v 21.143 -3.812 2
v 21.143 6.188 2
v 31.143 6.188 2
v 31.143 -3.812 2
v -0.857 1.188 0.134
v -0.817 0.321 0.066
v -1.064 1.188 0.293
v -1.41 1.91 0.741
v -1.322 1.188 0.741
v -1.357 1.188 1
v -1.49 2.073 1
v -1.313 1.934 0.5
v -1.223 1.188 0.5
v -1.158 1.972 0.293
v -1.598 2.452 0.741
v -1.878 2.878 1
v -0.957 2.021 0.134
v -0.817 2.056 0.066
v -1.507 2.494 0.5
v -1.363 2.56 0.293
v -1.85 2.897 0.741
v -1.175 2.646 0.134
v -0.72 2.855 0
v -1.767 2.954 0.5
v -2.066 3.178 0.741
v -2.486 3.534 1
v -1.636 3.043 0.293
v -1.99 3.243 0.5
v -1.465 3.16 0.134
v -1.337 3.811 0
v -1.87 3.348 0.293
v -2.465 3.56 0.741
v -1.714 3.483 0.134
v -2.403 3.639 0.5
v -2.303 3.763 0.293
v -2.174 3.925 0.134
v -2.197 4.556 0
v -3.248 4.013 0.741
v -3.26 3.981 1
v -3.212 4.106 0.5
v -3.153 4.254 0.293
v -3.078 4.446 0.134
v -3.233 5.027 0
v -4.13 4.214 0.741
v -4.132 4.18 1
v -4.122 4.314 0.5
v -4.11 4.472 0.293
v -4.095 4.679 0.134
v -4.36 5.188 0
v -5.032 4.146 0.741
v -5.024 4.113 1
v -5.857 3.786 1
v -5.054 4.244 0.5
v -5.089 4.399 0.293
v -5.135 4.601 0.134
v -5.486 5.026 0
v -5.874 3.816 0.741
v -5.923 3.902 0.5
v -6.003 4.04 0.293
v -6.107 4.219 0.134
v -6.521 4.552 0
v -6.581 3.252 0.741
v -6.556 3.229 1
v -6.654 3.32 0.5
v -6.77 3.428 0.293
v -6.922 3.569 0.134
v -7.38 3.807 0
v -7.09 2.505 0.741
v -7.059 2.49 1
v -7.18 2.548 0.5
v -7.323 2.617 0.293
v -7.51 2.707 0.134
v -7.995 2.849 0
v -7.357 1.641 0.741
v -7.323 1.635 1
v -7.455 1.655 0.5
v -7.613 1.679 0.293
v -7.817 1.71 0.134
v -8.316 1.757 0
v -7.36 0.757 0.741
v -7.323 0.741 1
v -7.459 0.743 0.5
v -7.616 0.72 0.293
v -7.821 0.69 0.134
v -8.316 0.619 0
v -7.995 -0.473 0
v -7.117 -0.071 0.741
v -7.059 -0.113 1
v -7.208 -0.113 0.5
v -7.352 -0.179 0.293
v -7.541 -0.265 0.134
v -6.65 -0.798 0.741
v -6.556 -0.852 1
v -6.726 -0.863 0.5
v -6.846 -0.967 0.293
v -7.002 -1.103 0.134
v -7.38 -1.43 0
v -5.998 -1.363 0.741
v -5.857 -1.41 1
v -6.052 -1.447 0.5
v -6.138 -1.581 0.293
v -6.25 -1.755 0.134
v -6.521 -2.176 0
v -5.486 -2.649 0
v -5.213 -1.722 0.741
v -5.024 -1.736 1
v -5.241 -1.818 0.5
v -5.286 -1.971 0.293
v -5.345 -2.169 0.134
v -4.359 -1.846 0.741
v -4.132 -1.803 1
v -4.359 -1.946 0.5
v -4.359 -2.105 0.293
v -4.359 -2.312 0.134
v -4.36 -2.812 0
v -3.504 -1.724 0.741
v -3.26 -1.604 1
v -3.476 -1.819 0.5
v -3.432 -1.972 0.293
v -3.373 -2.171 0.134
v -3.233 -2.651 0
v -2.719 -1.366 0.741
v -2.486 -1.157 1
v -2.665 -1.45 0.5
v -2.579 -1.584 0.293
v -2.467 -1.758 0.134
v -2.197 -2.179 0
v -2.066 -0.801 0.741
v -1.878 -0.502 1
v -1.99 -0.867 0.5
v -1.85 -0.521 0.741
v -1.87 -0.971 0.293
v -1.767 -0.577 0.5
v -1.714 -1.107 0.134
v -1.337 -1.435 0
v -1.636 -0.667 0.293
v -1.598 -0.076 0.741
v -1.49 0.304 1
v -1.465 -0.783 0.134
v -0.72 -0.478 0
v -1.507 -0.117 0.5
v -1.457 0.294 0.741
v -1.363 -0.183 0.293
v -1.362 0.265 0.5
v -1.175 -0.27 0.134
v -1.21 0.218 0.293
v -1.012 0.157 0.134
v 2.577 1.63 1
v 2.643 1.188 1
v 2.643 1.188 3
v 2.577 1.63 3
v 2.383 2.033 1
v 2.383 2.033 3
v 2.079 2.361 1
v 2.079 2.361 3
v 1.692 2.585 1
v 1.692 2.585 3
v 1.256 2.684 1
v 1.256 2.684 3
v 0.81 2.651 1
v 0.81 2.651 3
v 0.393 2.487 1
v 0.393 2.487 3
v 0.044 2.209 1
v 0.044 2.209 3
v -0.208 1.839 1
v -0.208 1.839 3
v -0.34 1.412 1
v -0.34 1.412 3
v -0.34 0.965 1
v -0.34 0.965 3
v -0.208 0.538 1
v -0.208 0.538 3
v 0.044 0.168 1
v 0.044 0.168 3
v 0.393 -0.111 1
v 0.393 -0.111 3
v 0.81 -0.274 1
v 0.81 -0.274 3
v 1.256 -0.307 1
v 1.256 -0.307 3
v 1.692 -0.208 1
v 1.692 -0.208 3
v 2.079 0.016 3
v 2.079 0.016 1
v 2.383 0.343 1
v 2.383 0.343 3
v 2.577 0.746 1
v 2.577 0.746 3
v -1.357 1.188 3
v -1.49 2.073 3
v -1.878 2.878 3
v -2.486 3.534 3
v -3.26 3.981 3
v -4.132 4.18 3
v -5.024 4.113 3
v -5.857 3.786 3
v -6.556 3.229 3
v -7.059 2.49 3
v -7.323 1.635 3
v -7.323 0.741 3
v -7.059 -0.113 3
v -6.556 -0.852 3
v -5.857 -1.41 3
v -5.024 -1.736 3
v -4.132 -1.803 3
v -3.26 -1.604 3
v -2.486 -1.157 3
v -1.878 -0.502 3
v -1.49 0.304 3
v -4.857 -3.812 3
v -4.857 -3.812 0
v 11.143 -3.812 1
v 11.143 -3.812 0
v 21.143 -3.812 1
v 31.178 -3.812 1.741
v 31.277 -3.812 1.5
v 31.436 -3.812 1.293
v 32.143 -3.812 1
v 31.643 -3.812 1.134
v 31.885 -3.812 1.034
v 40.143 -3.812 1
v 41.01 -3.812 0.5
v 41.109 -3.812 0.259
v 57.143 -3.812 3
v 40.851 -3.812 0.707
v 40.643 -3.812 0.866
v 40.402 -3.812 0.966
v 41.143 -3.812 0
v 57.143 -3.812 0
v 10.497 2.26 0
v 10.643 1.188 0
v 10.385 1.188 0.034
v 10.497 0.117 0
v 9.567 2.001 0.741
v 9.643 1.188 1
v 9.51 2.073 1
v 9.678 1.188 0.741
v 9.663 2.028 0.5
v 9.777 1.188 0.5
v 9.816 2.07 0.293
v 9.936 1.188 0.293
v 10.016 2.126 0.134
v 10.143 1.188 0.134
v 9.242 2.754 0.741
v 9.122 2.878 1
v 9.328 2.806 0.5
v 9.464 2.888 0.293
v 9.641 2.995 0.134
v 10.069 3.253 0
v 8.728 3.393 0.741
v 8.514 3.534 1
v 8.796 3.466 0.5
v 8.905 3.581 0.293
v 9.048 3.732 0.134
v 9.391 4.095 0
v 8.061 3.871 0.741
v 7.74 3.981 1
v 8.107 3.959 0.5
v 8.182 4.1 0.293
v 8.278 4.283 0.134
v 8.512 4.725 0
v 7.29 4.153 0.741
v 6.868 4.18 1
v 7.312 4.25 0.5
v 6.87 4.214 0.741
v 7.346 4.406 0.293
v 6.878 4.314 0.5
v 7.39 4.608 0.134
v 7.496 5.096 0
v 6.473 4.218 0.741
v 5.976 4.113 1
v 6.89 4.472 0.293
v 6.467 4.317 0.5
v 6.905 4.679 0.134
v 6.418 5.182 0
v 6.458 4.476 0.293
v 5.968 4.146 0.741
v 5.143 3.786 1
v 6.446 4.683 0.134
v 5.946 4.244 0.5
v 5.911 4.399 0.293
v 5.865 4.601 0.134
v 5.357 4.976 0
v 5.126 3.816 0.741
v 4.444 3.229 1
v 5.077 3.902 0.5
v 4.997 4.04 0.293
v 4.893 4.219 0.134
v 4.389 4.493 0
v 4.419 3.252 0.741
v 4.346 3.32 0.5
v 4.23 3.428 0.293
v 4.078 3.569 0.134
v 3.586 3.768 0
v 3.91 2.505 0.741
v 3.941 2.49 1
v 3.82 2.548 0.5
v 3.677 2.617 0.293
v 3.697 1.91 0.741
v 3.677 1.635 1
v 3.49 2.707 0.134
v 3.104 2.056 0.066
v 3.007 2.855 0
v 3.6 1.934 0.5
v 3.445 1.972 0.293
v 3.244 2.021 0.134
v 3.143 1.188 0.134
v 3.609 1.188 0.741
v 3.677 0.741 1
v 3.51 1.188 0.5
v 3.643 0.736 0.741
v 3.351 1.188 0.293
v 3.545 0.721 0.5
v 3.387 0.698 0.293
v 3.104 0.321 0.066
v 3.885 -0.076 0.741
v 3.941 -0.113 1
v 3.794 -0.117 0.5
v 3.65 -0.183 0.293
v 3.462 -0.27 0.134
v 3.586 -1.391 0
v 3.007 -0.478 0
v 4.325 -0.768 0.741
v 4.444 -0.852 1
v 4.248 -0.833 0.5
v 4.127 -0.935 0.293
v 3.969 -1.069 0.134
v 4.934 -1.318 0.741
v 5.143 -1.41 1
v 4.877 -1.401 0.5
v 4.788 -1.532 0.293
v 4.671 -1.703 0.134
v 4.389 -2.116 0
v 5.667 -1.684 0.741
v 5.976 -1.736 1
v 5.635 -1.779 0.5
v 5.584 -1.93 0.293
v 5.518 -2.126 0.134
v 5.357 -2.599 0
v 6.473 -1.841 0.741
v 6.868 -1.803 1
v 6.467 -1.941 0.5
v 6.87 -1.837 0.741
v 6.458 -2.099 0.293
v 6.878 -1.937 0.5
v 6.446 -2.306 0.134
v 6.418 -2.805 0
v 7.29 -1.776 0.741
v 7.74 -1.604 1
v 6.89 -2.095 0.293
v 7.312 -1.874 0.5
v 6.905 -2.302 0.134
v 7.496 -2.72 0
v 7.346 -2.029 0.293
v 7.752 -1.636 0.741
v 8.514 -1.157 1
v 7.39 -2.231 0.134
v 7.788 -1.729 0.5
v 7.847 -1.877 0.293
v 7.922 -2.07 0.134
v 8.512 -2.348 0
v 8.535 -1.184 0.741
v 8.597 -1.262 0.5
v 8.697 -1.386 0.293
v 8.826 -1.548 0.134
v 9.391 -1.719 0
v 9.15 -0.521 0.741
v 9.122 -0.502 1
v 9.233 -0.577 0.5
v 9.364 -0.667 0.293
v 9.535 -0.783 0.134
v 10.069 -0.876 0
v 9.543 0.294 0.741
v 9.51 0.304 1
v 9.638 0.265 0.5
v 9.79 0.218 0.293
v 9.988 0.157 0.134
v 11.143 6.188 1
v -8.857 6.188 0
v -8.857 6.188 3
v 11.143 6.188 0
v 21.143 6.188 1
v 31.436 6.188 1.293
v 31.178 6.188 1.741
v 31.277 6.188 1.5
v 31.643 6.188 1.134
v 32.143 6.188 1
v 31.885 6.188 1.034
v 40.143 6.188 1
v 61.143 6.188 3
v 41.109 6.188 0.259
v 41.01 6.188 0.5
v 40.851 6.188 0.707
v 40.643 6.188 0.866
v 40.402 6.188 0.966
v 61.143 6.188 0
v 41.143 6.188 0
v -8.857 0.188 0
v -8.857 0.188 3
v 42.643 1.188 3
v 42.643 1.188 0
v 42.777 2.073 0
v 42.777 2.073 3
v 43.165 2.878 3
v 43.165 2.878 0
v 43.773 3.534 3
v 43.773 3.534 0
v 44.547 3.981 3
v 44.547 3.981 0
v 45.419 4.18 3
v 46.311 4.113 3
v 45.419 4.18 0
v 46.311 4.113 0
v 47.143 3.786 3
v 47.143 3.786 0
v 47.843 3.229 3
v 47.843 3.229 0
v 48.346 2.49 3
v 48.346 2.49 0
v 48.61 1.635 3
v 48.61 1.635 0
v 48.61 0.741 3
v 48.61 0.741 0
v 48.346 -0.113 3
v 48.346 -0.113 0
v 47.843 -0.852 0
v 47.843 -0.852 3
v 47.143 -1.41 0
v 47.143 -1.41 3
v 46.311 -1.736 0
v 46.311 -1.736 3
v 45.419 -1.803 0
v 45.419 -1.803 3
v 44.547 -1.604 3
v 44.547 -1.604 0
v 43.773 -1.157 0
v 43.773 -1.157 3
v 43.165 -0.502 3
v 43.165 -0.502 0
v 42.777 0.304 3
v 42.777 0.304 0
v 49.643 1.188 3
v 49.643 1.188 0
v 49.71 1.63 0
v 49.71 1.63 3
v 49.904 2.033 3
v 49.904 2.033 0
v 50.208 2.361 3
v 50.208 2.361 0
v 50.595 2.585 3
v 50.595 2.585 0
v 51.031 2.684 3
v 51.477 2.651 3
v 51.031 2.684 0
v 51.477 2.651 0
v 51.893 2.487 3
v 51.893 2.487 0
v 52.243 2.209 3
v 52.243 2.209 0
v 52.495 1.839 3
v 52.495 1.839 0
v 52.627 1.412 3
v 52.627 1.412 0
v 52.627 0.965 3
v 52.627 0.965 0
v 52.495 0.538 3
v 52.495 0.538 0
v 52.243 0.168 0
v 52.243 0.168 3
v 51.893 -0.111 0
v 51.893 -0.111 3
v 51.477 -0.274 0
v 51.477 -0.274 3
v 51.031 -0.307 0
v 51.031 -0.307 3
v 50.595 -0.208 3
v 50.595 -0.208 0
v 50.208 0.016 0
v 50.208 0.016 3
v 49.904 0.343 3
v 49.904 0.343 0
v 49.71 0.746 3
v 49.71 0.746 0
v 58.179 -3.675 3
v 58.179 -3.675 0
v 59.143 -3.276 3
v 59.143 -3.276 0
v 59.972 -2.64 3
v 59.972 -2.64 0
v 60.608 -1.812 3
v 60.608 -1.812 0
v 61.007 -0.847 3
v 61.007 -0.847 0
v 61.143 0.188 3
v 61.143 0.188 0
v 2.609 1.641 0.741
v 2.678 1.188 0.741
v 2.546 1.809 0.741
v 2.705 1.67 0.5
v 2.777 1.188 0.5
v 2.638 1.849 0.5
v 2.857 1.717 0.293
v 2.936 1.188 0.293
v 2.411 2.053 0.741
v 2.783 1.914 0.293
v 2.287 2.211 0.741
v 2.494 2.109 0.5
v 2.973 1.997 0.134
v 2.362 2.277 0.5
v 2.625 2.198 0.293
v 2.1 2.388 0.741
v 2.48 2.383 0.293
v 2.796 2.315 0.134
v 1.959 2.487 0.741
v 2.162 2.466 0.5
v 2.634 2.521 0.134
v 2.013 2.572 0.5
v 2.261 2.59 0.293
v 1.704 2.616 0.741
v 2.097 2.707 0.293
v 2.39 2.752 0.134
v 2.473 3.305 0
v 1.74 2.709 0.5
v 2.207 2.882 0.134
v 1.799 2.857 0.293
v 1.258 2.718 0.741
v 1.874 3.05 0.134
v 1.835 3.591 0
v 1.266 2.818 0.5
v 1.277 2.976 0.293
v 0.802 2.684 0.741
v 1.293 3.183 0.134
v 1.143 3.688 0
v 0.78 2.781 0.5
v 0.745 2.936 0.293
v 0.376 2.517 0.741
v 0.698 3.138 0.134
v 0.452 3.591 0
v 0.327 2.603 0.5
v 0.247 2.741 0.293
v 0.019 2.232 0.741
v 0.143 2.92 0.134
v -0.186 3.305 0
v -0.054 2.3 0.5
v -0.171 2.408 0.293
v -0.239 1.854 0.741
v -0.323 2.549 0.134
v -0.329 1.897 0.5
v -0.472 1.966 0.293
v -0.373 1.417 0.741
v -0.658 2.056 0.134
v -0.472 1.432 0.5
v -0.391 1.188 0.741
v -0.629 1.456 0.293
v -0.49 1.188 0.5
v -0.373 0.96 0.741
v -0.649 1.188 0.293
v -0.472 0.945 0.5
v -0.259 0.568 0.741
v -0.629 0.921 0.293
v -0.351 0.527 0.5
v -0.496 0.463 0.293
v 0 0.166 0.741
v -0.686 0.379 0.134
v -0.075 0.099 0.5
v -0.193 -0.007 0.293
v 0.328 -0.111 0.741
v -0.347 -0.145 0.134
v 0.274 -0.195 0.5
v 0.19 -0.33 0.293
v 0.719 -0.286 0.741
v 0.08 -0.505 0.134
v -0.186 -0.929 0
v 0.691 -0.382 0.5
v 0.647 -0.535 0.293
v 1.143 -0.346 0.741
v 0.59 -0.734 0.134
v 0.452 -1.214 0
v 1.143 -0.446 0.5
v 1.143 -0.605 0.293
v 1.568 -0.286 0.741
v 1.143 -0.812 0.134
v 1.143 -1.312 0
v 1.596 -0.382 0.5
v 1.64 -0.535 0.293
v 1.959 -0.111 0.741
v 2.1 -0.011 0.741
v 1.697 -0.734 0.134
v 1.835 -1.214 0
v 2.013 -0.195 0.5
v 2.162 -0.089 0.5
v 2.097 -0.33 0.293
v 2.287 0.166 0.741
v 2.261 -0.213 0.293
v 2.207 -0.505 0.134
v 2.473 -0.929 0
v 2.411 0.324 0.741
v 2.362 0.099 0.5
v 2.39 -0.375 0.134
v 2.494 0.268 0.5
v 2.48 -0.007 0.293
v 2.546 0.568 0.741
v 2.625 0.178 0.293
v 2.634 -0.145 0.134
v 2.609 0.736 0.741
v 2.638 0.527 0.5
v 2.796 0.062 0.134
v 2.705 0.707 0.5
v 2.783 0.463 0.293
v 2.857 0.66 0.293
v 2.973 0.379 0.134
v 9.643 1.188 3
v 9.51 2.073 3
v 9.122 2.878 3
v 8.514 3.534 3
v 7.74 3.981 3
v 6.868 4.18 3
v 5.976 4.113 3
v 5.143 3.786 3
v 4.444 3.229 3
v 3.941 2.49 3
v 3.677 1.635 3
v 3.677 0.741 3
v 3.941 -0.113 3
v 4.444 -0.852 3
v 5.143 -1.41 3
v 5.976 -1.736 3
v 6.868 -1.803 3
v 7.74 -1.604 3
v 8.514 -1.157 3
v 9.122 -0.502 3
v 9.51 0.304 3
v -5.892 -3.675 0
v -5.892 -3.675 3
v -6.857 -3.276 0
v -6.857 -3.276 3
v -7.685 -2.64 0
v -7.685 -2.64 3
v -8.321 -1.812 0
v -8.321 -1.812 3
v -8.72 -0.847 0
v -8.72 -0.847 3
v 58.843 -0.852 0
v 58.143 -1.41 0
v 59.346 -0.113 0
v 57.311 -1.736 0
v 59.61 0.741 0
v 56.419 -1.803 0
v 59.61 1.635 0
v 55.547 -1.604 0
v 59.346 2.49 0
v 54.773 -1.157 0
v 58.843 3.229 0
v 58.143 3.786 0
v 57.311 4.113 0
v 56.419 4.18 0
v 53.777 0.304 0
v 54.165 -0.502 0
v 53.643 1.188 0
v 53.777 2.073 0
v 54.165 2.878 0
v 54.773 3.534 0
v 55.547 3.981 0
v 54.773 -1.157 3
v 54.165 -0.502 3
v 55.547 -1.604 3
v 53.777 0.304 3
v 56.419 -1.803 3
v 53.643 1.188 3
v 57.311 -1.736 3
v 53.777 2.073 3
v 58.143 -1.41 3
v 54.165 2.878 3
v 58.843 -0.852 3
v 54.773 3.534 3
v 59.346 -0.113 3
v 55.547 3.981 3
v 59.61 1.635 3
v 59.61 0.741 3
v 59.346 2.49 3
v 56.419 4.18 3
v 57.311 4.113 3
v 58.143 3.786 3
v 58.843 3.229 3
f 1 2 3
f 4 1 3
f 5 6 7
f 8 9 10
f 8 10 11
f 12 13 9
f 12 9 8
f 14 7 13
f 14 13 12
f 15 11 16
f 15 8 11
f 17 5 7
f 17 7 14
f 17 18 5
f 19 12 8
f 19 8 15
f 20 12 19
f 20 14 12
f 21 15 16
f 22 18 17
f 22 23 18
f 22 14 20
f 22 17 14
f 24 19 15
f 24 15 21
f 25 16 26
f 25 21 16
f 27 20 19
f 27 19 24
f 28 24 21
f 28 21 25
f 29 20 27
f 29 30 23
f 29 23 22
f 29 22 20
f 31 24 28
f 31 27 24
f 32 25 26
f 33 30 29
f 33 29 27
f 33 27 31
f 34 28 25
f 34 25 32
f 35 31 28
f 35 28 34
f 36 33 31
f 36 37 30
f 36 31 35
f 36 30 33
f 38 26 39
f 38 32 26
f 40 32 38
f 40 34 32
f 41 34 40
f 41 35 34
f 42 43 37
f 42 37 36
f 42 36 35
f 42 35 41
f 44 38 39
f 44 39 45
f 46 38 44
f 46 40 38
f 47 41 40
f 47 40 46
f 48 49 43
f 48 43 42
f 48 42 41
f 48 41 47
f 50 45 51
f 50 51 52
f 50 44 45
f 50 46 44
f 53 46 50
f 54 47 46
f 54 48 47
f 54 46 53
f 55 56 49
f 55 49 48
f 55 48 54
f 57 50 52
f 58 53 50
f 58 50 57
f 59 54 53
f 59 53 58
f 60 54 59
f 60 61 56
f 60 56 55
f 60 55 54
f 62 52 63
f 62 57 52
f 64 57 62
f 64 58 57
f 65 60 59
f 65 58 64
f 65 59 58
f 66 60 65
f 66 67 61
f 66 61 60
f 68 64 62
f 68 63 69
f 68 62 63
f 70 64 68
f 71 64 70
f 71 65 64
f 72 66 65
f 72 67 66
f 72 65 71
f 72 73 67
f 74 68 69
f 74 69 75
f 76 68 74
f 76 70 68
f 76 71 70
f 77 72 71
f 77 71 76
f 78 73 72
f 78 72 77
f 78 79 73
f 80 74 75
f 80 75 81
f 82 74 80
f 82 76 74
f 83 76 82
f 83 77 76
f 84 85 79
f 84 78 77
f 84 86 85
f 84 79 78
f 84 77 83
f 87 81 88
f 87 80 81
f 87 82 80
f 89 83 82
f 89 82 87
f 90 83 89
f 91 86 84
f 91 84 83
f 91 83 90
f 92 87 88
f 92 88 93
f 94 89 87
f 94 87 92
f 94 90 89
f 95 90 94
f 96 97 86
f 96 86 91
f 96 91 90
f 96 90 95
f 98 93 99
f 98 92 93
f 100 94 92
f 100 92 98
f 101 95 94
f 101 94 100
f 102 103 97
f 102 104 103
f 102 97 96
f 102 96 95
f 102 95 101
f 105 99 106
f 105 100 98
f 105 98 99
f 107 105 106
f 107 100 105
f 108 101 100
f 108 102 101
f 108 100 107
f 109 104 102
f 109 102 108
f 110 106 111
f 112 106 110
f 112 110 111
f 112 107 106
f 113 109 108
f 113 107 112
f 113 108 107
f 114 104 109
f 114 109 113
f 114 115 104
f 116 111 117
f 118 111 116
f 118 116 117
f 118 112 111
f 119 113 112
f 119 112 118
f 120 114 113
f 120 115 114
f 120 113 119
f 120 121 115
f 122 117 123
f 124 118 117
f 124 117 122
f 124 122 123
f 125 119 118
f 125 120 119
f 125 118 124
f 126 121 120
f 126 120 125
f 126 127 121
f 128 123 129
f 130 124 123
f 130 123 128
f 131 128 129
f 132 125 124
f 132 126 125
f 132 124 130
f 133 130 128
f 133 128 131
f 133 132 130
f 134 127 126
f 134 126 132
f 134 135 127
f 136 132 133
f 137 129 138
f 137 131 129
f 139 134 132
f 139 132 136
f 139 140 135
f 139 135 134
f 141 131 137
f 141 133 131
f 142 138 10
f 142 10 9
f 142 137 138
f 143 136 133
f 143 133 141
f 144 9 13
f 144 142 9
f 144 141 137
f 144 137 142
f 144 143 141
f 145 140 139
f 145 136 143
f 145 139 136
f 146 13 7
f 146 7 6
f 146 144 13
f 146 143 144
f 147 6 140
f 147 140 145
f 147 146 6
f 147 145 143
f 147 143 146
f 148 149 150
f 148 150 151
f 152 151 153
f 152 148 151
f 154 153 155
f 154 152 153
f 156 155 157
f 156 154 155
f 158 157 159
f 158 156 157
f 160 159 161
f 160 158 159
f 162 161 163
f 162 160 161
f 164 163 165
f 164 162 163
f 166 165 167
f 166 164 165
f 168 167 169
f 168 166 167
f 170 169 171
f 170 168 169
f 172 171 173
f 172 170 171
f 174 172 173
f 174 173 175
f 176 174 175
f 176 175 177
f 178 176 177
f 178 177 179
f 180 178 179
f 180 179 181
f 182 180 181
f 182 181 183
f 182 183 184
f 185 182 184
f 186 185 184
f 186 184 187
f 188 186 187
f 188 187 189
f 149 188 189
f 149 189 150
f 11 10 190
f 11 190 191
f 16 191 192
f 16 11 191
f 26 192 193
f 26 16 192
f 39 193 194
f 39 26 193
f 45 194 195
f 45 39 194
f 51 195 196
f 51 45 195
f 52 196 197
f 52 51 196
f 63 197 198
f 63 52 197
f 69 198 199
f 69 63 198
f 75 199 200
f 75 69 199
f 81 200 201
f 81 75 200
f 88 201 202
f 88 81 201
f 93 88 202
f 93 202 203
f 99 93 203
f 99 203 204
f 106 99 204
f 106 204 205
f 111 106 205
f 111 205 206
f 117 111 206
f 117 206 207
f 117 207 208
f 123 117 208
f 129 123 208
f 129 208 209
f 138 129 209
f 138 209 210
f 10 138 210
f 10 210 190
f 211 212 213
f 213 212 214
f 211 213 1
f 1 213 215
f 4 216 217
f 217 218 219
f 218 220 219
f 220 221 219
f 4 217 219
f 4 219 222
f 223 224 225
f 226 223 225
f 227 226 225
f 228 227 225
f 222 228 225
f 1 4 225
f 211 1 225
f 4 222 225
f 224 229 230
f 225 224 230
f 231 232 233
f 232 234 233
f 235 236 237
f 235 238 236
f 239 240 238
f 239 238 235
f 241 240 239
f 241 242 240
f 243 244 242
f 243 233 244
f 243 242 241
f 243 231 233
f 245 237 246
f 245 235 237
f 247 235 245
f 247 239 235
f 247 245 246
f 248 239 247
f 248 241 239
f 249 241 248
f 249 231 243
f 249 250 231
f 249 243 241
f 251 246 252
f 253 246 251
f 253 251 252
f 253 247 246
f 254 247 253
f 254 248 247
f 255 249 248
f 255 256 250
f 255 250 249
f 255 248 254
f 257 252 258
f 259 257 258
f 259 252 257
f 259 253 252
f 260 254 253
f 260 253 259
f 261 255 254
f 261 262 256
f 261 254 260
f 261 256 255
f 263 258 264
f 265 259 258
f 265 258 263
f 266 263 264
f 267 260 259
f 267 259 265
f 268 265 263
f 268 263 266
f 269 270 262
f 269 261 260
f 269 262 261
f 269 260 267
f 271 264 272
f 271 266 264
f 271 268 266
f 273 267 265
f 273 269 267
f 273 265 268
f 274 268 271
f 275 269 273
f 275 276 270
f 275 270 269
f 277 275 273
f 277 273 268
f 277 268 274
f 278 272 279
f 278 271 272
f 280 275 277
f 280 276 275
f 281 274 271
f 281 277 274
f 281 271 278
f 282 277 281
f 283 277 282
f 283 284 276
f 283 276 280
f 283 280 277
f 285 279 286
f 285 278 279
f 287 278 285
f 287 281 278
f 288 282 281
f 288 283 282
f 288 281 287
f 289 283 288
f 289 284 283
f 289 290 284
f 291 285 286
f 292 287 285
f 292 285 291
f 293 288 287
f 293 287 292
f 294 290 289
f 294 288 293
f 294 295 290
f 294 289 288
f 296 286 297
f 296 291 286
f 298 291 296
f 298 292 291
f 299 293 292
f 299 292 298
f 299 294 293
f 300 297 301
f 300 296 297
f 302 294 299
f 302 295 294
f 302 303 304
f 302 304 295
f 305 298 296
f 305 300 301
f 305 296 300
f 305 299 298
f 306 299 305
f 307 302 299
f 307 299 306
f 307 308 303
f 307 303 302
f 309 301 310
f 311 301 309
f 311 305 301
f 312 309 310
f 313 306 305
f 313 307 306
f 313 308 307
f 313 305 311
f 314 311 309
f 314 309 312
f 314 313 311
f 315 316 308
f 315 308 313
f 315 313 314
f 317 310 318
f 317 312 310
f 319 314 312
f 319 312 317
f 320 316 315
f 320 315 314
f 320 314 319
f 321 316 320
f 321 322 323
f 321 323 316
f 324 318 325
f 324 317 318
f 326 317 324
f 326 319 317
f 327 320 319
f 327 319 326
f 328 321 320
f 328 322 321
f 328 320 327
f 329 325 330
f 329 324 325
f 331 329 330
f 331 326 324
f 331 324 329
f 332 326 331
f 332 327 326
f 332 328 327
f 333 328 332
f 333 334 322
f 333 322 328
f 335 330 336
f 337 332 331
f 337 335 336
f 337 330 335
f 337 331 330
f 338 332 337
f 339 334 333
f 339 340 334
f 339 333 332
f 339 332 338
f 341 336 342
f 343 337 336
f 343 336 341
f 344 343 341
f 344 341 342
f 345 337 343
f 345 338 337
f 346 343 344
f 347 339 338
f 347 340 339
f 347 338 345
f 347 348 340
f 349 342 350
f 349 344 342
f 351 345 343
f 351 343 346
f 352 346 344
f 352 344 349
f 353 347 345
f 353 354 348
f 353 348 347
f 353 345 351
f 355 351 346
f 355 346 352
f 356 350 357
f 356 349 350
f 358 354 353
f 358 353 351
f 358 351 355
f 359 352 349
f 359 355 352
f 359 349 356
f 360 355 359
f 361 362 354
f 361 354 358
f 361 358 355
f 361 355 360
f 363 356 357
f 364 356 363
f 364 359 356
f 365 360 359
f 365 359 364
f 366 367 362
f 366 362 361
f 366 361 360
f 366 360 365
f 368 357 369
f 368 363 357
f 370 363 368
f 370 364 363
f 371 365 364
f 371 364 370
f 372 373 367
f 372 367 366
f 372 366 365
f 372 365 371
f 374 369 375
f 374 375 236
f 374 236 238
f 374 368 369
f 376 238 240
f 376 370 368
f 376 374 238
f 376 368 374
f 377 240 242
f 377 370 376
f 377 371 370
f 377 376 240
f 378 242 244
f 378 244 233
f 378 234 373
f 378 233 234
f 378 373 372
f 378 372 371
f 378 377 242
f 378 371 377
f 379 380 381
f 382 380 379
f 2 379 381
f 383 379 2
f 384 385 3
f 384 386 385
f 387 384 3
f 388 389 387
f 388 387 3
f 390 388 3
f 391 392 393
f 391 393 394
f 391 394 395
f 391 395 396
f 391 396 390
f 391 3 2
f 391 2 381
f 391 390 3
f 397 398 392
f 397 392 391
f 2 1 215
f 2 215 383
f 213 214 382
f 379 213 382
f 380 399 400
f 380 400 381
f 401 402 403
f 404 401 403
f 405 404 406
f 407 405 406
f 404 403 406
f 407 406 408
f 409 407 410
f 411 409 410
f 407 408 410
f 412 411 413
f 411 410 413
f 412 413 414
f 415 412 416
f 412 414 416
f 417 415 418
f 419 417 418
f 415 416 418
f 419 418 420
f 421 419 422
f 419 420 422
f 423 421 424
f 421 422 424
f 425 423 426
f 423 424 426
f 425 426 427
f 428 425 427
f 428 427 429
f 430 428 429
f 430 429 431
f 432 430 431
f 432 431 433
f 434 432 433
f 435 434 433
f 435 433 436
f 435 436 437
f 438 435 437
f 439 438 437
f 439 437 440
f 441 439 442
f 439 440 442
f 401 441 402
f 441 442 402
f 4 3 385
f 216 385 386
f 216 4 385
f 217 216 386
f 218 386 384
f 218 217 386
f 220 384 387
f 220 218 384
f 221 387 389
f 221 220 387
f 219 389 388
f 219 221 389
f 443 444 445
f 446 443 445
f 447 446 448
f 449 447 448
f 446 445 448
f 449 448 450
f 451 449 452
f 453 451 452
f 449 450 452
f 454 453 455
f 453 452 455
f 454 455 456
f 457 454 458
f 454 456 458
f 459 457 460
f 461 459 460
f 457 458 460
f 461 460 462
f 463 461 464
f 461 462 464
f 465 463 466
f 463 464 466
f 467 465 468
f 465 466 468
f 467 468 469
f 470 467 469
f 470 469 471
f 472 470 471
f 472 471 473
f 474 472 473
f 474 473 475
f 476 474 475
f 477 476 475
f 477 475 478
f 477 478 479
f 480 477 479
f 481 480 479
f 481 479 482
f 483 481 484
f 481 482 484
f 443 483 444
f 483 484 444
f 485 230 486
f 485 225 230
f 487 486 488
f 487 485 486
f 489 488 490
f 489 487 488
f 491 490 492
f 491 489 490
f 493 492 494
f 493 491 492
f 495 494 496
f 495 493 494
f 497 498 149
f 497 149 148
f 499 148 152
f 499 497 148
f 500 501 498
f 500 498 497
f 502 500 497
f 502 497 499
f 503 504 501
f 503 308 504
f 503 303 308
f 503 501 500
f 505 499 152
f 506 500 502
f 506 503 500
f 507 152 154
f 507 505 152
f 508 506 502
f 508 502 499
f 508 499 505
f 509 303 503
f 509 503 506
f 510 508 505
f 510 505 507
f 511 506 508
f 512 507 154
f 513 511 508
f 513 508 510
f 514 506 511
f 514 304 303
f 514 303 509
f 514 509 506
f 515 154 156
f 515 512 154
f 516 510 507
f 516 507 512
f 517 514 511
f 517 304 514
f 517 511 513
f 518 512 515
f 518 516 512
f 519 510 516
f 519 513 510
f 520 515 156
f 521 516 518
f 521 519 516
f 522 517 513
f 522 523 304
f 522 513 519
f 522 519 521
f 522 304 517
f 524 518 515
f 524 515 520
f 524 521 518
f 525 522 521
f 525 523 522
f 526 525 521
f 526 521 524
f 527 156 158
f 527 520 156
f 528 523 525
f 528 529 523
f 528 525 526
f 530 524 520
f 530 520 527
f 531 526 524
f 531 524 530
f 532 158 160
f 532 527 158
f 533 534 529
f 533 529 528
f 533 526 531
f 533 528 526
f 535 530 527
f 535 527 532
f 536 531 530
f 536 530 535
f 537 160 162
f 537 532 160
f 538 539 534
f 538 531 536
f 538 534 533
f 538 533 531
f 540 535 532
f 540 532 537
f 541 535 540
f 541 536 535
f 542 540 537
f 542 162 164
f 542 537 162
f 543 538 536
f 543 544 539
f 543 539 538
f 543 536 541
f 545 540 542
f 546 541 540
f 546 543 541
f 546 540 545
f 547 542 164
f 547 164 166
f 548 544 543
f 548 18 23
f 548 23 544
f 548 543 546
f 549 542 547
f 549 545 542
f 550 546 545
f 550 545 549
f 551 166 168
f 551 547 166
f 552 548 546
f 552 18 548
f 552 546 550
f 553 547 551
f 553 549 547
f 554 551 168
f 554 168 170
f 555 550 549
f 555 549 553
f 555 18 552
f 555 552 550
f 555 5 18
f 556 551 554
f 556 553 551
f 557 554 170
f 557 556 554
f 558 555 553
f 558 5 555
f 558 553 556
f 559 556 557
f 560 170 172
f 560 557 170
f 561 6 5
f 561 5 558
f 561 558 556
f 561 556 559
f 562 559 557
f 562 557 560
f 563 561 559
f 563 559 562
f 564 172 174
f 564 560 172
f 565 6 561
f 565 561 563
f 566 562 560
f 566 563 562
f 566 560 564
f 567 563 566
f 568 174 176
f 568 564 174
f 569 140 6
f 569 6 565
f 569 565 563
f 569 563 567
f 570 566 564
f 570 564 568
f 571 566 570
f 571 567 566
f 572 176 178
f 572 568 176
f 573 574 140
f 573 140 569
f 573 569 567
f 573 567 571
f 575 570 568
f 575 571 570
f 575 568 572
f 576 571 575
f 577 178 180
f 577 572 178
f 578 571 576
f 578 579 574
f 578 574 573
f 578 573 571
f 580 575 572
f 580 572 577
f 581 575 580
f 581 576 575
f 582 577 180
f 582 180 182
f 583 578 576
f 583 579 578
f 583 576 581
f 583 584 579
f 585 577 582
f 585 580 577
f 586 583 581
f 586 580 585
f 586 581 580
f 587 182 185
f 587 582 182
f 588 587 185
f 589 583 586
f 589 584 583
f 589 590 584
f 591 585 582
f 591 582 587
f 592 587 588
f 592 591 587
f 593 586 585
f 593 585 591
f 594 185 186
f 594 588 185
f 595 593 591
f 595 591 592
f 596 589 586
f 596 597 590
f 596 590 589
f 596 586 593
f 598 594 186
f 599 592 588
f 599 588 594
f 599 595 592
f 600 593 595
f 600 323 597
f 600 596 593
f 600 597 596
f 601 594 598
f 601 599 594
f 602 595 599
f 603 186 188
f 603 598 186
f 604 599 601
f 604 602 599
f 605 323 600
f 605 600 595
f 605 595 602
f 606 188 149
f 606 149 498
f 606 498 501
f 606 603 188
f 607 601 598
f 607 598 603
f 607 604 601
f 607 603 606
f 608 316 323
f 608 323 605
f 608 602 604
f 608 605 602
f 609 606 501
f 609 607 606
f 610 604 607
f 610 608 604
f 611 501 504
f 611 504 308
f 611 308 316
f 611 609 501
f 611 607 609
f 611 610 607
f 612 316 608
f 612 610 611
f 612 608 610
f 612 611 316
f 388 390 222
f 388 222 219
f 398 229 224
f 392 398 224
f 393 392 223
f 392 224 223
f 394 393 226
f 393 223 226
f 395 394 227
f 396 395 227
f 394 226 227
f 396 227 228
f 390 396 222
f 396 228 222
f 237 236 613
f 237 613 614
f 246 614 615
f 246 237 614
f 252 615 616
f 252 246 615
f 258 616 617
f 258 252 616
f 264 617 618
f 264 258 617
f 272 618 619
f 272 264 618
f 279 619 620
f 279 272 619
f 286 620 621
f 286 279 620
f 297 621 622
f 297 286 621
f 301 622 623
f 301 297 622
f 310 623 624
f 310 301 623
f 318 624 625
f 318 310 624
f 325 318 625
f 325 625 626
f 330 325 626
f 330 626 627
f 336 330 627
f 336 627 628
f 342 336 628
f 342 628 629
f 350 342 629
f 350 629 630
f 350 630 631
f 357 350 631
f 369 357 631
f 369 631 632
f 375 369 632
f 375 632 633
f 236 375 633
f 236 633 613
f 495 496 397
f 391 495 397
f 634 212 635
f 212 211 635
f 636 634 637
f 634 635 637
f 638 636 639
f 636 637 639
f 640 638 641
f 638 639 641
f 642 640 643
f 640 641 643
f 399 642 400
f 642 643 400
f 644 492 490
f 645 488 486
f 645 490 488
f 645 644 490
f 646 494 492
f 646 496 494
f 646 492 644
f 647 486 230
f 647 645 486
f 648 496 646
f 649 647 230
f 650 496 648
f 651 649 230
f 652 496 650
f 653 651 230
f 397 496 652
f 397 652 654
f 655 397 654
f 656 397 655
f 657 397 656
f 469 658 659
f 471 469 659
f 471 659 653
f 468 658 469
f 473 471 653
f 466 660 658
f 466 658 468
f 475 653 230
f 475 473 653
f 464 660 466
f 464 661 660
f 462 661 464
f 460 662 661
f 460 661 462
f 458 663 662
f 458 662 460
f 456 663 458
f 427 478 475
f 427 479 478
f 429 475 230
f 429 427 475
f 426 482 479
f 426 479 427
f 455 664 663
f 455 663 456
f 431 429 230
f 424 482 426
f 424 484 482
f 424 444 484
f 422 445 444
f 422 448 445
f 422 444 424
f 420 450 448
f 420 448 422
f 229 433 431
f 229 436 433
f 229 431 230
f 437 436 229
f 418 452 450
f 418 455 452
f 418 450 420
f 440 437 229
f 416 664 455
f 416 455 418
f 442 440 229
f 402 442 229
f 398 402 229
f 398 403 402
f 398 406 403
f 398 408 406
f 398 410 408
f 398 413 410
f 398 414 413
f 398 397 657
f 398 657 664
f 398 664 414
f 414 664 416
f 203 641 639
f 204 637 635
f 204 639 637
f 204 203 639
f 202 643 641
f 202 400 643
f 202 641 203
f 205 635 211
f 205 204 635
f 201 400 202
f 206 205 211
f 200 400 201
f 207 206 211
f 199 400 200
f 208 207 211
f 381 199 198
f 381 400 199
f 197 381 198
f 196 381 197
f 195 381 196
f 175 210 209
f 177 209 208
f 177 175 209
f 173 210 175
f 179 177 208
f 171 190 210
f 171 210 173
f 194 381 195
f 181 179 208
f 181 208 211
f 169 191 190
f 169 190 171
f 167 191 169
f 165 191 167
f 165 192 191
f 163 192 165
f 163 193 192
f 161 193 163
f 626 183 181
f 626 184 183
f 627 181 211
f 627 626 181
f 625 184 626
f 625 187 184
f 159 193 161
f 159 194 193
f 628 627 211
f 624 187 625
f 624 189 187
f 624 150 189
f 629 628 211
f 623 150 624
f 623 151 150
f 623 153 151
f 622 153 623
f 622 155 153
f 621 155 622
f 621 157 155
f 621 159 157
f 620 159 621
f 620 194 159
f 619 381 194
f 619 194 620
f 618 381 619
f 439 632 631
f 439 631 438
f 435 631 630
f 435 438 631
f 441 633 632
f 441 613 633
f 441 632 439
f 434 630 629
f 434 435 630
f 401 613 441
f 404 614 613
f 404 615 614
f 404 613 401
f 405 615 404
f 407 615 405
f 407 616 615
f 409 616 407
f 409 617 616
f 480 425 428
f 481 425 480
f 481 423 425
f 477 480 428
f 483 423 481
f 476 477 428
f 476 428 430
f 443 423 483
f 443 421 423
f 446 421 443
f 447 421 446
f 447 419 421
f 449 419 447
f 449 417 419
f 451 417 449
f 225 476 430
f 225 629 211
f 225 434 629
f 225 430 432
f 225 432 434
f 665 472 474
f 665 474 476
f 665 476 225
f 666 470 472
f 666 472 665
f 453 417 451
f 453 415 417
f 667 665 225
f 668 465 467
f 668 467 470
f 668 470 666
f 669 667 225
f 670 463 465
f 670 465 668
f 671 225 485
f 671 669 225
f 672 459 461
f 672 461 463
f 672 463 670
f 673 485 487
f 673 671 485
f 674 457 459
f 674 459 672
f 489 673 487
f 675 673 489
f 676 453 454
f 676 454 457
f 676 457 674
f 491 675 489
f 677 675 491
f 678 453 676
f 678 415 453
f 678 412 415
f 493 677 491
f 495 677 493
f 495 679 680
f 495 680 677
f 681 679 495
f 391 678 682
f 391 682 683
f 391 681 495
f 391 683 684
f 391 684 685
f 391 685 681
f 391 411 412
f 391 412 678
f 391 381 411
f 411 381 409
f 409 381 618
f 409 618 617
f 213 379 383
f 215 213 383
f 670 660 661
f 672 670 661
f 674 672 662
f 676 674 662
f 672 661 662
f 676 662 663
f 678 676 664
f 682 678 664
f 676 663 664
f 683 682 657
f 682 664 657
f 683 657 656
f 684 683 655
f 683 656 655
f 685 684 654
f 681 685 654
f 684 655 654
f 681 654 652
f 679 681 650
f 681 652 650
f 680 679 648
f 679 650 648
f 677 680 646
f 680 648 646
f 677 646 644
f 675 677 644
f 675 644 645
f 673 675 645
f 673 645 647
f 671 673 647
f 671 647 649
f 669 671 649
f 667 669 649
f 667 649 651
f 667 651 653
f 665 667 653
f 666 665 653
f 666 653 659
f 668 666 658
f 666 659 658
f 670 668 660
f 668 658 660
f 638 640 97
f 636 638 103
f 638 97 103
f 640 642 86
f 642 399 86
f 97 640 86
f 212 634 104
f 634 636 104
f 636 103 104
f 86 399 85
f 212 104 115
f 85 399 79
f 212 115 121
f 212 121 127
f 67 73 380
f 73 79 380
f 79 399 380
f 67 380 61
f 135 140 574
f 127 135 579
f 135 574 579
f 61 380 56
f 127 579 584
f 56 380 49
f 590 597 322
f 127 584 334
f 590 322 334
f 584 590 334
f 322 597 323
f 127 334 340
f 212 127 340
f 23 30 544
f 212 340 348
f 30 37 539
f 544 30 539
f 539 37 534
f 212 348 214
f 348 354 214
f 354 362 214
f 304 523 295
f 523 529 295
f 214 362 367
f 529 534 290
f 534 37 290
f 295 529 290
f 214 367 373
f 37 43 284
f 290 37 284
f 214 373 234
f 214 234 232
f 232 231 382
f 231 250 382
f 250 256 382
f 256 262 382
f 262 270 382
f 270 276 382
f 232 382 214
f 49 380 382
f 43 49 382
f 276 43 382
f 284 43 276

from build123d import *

# Parameters (mm, degrees)
SKETCH1_W           = 20
SKETCH1_H           = 10
SKETCH1_R           = 3
SKETCH1_R_2         = 1.5
BOSS_EXTRUDE1_DEPTH = 3
SKETCH2_W           = 10
SKETCH2_H           = 10
BOSS_EXTRUDE2_DEPTH = 2
SKETCH3_W           = 10
SKETCH3_H           = 10
BOSS_EXTRUDE3_DEPTH = 1
FILLET1_R           = 4
FILLET2_START       = -5
FILLET2_DEPTH       = 12
FILLET2_START_2     = -3.811659193
FILLET2_2_DEPTH     = 10
FILLET3_R           = 1


with BuildPart() as part:
    # Sketch1 → Boss-Extrude1 (new body)
    with BuildSketch(Plane.XY):
        with Locations((1.143497758, 1.188340807)):
            Rectangle(SKETCH1_W, SKETCH1_H)
        with Locations((-4.356502242, 1.188340807)):
            Circle(SKETCH1_R, mode=Mode.SUBTRACT)
        with Locations((6.643497758, 1.188340807)):
            Circle(SKETCH1_R, mode=Mode.SUBTRACT)
        with Locations((1.143497758, 1.188340807)):
            Circle(SKETCH1_R_2, mode=Mode.SUBTRACT)
    extrude(amount=BOSS_EXTRUDE1_DEPTH)

    # Sketch2 → Boss-Extrude2 (add)
    with BuildSketch(Plane.XY.offset(3)):
        with Locations((16.143497758, 1.188340807)):
            Rectangle(SKETCH2_W, SKETCH2_H)
    extrude(amount=-BOSS_EXTRUDE2_DEPTH)

    # Sketch3 → Boss-Extrude3 (add)
    with BuildSketch(Plane.XY.offset(3)):
        with Locations((26.143497758, 1.188340807)):
            Rectangle(SKETCH3_W, SKETCH3_H)
    extrude(amount=-BOSS_EXTRUDE3_DEPTH)


with BuildPart() as body_2:
    # Mirror3: mirrored copy
    add(part.part.mirror(Plane(origin=(26.143497758, 0, 0), x_dir=(0, 0, 1), z_dir=(1, 0, 0))))


with BuildPart() as part_1:
    add(part.part)

    # Combine1: union body 2
    add(body_2.part)

    # Fillet1
    fillet1_edges = [part_1.edges().sort_by_distance(p)[0] for p in [
        (61.143497758, -3.811659193, 1.5),
        (-8.856502242, -3.811659193, 1.5),
    ]]
    fillet(fillet1_edges, radius=FILLET1_R)

    # Fillet2: read off the stored shape, not the designer's step
    # Fillet2 outline → Fillet2 (cut)
    with BuildSketch(Plane(origin=(0, 0, 0), x_dir=(1, 0, 0), z_dir=(0, 1, 0)).offset(FILLET2_START)):
        with BuildLine():
            Line((31.143497758, -1), (31.143497758, -2))
            ThreePointArc((31.143497758, -2), (31.436390977, -1.292893219), (32.143497758, -1))
            Line((32.143497758, -1), (31.143497758, -1))
        make_face()
    extrude(amount=FILLET2_DEPTH, mode=Mode.SUBTRACT)

    # Fillet2 2 outline → Fillet2 2 (add)
    with BuildSketch(Plane(origin=(0, 0, 0), x_dir=(1, 0, 0), z_dir=(0, 1, 0)).offset(FILLET2_START_2)):
        with BuildLine():
            ThreePointArc((41.143497758, 0), (40.850604539, -0.707106781), (40.143497758, -1))
            Line((40.143497758, -1), (41.143497758, -1))
            Line((41.143497758, -1), (41.143497758, 0))
        make_face()
    extrude(amount=FILLET2_2_DEPTH)

    # Fillet3
    # the kernel refuses this fillet: 1 mm, written as the material it takes off along each edge
    with BuildSketch(Plane(origin=(-4.356502242, 1.188340807, 0), x_dir=(1, 0, 0), z_dir=(0, -1, 0))) as fillet3_piece_1:
        with BuildLine():
            CenterArc((3 + FILLET3_R, FILLET3_R), FILLET3_R, 180, 90)
            Line((3, FILLET3_R), (3, 0))
            Line((3, 0), (3 + FILLET3_R, 0))
        make_face()
    revolve(axis=Axis((-4.356502242, 1.188340807, 0), (0, 0, 1)), mode=Mode.SUBTRACT)
    with BuildSketch(Plane(origin=(6.643497758, 1.188340807, 0), x_dir=(1, 0, 0), z_dir=(0, -1, 0))) as fillet3_piece_2:
        with BuildLine():
            CenterArc((3 + FILLET3_R, FILLET3_R), FILLET3_R, 180, 90)
            Line((3, FILLET3_R), (3, 0))
            Line((3, 0), (3 + FILLET3_R, 0))
        make_face()
    revolve(axis=Axis((6.643497758, 1.188340807, 0), (0, 0, 1)), mode=Mode.SUBTRACT)
    with BuildSketch(Plane(origin=(1.143497758, 1.188340807, 0), x_dir=(1, 0, 0), z_dir=(0, -1, 0))) as fillet3_piece_3:
        with BuildLine():
            CenterArc((1.5 + FILLET3_R, FILLET3_R), FILLET3_R, 180, 90)
            Line((1.5, FILLET3_R), (1.5, 0))
            Line((1.5, 0), (1.5 + FILLET3_R, 0))
        make_face()
    revolve(axis=Axis((1.143497758, 1.188340807, 0), (0, 0, 1)), mode=Mode.SUBTRACT)


solid = part_1.part
